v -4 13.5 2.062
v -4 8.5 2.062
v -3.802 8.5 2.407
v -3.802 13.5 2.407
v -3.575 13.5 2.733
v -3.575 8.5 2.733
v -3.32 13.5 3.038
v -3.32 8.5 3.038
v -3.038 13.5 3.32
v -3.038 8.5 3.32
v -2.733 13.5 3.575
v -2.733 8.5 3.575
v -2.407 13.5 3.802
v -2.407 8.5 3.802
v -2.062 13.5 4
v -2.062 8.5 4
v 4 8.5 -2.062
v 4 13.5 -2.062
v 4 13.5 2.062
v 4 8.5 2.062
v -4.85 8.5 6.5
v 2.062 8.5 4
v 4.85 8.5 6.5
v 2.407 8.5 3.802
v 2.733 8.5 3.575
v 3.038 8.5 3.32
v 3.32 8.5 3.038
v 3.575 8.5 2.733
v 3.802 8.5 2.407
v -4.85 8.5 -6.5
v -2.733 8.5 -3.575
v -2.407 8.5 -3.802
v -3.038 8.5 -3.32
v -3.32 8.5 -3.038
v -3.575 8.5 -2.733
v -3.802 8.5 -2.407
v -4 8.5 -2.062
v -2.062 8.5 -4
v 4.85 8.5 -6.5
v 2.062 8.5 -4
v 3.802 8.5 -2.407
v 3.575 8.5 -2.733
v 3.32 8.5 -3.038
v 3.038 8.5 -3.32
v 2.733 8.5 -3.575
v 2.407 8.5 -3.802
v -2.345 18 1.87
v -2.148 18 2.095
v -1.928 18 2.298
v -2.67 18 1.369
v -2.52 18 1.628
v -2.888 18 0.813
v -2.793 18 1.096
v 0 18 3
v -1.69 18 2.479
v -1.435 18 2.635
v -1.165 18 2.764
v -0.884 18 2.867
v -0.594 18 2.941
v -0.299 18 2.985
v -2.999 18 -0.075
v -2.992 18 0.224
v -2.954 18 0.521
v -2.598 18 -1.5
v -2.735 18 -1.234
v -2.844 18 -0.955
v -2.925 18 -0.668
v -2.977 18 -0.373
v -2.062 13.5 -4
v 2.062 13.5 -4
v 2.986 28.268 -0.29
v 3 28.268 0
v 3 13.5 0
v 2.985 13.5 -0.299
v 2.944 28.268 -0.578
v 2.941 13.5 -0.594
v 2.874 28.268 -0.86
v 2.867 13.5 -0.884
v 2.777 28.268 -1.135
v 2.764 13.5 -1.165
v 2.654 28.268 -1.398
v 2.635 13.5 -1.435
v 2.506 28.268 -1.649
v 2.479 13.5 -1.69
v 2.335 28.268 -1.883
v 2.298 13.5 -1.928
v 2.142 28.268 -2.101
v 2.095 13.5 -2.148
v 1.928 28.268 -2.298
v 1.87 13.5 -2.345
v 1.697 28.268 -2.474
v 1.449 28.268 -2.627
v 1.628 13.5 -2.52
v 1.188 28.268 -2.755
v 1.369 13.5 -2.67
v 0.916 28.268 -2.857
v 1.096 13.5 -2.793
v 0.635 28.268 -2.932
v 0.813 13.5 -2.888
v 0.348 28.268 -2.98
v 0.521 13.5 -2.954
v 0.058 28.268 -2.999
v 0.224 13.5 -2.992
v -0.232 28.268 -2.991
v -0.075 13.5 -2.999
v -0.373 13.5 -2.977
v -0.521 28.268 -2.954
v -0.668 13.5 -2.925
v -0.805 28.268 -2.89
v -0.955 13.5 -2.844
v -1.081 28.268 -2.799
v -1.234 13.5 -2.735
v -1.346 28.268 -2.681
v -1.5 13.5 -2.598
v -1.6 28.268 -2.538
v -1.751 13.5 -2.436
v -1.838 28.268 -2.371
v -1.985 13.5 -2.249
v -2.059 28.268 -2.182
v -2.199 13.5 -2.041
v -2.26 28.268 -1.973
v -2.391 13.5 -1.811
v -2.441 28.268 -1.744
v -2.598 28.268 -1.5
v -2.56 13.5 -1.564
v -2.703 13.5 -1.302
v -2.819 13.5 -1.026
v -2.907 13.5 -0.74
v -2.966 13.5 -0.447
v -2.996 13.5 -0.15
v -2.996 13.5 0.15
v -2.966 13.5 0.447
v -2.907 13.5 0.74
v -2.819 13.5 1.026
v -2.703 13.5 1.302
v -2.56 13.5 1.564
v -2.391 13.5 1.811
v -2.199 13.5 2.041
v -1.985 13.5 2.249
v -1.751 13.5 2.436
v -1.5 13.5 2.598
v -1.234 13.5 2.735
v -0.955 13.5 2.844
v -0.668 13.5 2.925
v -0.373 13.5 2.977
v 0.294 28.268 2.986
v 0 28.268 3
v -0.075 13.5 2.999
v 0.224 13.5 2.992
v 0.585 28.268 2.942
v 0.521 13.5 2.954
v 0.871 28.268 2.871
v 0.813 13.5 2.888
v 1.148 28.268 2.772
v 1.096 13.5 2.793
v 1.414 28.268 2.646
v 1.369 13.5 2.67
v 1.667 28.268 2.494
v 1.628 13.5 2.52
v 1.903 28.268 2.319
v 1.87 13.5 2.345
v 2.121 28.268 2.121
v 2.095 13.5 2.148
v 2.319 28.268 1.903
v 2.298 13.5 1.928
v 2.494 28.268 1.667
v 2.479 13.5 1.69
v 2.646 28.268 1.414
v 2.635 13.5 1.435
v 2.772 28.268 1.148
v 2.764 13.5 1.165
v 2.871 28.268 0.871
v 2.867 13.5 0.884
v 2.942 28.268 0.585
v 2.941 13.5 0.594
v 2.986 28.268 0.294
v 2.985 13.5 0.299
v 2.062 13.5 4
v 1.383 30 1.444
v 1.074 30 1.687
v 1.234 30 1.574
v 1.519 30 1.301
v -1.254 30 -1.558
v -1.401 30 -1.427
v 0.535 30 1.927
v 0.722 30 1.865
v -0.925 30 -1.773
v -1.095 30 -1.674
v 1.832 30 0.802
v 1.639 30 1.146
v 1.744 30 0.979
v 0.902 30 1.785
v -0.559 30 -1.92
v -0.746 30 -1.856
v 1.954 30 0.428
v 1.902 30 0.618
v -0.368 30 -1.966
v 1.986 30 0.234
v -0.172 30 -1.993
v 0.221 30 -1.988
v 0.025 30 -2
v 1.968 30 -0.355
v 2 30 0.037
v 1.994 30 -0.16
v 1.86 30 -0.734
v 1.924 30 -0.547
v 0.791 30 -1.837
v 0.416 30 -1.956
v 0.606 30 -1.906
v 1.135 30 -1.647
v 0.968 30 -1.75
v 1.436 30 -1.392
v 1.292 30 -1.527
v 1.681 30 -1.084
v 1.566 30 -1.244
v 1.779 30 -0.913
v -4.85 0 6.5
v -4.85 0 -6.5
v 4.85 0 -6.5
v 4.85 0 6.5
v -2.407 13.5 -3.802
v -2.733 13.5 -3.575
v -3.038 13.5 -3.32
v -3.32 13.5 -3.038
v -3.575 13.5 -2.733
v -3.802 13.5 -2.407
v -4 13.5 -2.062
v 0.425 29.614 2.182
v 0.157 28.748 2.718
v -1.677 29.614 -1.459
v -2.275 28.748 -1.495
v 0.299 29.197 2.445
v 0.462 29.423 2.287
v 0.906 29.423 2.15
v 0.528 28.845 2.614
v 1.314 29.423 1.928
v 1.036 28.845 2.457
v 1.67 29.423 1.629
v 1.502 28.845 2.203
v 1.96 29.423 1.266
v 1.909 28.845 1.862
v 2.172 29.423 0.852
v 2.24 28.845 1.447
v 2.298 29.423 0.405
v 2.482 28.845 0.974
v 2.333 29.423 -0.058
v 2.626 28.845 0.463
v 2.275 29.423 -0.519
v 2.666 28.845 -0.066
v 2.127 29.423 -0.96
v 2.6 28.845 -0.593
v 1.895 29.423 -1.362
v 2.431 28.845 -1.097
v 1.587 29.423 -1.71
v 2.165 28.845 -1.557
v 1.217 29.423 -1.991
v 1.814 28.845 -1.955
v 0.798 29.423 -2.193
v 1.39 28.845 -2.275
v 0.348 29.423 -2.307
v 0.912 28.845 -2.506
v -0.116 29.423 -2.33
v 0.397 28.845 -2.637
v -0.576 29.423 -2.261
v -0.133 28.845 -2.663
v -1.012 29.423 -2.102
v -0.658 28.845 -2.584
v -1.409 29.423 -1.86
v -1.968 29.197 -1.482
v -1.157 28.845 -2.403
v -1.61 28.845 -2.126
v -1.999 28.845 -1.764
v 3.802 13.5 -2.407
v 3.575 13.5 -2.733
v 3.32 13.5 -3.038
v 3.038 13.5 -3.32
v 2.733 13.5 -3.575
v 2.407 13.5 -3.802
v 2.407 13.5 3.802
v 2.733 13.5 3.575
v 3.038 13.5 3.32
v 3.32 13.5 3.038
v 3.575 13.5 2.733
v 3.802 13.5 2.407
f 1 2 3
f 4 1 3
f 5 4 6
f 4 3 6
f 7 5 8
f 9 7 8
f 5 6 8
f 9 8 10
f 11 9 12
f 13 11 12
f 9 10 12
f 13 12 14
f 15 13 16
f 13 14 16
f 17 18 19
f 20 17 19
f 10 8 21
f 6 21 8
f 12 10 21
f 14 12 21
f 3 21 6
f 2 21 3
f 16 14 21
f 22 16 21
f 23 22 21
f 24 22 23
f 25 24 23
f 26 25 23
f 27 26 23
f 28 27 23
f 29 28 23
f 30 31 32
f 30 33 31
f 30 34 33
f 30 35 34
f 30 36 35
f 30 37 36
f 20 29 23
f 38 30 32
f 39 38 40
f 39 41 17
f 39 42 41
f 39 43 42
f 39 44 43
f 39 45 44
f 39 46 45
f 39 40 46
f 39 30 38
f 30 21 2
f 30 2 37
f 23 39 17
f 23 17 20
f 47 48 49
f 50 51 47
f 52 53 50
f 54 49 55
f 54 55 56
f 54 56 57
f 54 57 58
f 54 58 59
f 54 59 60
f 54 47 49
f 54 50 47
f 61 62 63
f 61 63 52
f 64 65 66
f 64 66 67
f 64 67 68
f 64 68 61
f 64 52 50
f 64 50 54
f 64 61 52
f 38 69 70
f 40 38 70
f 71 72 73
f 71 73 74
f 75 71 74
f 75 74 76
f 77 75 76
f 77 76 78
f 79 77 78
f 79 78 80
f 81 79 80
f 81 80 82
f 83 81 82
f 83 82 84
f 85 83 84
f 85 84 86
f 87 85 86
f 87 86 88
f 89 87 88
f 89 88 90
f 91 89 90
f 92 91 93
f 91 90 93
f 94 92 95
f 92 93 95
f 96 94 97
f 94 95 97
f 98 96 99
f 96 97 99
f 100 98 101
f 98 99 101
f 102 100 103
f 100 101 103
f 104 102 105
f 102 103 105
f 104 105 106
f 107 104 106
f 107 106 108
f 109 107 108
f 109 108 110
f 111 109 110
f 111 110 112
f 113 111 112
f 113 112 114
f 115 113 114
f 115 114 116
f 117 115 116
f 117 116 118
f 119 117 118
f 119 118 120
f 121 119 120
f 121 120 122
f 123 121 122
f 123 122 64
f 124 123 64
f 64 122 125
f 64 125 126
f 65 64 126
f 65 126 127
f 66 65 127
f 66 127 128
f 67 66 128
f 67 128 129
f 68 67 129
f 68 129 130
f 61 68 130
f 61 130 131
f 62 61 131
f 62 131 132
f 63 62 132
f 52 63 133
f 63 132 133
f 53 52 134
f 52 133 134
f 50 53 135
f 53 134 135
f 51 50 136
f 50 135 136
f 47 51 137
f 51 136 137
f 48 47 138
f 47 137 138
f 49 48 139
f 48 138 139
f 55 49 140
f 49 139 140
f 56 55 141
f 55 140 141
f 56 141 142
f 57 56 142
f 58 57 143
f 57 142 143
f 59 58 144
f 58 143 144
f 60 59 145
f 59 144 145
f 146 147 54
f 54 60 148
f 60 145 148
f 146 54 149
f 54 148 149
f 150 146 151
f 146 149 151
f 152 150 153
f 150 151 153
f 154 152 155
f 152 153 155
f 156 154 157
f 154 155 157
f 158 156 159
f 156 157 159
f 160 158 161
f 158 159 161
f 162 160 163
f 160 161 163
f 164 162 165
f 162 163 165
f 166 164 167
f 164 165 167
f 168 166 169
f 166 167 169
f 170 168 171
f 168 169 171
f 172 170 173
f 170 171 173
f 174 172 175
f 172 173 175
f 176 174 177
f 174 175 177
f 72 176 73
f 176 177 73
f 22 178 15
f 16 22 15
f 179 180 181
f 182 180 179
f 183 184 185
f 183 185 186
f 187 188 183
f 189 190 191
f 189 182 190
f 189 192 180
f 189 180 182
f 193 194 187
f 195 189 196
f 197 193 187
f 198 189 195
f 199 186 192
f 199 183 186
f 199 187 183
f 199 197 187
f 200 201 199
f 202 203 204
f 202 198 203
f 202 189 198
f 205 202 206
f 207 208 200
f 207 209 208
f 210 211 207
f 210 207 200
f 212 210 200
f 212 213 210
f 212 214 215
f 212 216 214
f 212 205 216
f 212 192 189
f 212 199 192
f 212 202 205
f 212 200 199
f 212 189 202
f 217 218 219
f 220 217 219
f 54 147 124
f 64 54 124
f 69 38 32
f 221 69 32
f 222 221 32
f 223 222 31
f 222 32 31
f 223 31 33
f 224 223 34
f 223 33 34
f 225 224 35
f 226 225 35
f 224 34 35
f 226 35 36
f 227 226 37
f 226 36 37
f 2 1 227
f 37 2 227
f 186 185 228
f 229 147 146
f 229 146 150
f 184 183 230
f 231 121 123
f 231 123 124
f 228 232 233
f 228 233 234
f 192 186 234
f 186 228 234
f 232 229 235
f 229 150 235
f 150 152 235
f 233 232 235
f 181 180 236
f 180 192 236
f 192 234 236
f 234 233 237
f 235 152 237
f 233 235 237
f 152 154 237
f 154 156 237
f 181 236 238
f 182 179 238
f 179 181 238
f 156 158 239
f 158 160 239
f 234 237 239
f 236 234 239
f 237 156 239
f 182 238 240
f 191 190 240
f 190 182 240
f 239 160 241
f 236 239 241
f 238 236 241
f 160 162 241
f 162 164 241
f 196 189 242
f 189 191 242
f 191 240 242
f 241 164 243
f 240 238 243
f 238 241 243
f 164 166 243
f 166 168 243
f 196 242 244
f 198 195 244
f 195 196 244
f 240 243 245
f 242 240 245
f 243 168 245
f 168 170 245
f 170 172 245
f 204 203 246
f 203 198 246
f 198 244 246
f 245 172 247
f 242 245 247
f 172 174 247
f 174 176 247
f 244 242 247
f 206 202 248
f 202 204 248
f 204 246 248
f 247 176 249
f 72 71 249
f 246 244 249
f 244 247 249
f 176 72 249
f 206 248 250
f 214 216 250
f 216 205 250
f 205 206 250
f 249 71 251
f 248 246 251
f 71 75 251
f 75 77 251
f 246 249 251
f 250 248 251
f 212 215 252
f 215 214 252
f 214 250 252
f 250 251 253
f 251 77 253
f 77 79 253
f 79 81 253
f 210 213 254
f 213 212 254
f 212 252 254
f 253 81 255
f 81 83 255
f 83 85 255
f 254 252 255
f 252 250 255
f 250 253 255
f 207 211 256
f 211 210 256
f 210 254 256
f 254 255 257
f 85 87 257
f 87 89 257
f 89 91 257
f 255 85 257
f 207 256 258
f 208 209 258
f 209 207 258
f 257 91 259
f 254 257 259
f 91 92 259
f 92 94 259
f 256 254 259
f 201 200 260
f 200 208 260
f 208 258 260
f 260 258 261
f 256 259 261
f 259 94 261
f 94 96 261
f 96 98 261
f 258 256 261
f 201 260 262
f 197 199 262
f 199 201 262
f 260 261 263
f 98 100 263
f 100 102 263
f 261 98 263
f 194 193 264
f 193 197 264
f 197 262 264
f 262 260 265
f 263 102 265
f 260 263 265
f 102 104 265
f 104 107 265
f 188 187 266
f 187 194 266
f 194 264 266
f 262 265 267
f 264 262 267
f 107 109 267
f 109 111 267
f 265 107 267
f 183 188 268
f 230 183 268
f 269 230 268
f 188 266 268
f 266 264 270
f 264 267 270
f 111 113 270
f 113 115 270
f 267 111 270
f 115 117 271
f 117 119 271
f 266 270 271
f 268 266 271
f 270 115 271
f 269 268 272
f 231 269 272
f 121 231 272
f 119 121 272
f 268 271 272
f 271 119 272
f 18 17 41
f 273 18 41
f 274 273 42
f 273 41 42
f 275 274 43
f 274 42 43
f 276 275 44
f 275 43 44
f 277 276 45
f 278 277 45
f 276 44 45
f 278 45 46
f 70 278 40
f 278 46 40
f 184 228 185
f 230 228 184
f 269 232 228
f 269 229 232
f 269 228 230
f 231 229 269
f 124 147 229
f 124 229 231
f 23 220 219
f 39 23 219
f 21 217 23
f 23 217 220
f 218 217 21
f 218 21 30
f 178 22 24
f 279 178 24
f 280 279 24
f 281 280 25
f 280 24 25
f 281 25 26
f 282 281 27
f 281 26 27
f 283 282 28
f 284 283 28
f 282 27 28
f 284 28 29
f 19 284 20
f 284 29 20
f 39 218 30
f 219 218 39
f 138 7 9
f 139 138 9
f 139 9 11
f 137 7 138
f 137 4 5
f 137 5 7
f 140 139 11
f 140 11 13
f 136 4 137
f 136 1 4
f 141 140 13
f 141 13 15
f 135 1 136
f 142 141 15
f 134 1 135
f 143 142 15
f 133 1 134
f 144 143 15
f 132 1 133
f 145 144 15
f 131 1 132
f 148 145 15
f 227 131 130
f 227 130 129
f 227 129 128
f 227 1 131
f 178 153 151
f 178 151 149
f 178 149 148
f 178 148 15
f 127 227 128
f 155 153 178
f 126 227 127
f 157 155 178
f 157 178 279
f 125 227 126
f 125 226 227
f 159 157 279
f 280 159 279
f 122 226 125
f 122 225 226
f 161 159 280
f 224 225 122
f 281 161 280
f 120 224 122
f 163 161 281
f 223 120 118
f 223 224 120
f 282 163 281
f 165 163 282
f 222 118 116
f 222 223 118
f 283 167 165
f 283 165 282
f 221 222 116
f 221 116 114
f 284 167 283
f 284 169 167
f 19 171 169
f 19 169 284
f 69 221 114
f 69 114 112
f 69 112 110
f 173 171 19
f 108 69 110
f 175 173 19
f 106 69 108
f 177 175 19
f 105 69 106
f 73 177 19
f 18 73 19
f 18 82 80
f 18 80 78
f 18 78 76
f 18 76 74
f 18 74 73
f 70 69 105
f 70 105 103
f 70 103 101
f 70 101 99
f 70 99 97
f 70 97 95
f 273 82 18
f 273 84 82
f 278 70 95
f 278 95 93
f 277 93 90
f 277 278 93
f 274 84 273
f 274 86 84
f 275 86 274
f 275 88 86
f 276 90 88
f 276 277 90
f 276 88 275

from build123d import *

# Parameters (mm, degrees)
SKETCH1_W           = 9.7
SKETCH1_H           = 13
BOSS_EXTRUDE1_DEPTH = 8.5
SKETCH2_R           = 4.5
BOSS_EXTRUDE2_DEPTH = 5
BOSS_EXTRUDE4_START = -5
SKETCH3_R           = 3
BOSS_EXTRUDE4_DEPTH = 21.5
CUT_EXTRUDE1_DEPTH  = 5
CUT_EXTRUDE2_DEPTH  = 12
CHAMFER1_SIZE       = 1
CHAMFER1_SIZE2      = 1.732050808


with BuildPart() as part:
    # Sketch1 → Boss-Extrude1 (new body)
    with BuildSketch(Plane(origin=(0, 0, 0), x_dir=(1, 0, 0), z_dir=(0, 1, 0))):
        Rectangle(SKETCH1_W, SKETCH1_H)
    extrude(amount=BOSS_EXTRUDE1_DEPTH)

    # Sketch2 → Boss-Extrude2 (add)
    with BuildSketch(Plane(origin=(0, 8.5, 0), x_dir=(1, 0, 0), z_dir=(0, 1, 0))):
        Circle(SKETCH2_R)
    extrude(amount=BOSS_EXTRUDE2_DEPTH)

    # Sketch3 → Boss-Extrude4 (add)
    with BuildSketch(Plane(origin=(0, 13.5, 0), x_dir=(1, 0, 0), z_dir=(0, 1, 0)).offset(BOSS_EXTRUDE4_START)):
        Circle(SKETCH3_R)
    extrude(amount=BOSS_EXTRUDE4_DEPTH)

    # Sketch4 → Cut-Extrude1 (cut)
    with BuildSketch(Plane(origin=(0, 13.5, 0), x_dir=(1, 0, 0), z_dir=(0, 1, 0))):
        with BuildLine():
            ThreePointArc((-4, 2.061552813), (-4.5, 0), (-4, -2.061552813))
            Line((-4, -2.061552813), (-4, 2.061552813))
        make_face()
        with BuildLine():
            ThreePointArc((-2.061552813, -4), (0, -4.5), (2.061552813, -4))
            Line((2.061552813, -4), (-2.061552813, -4))
        make_face()
        with BuildLine():
            Line((4, 2.061552813), (4, -2.061552813))
            ThreePointArc((4, -2.061552813), (4.373213921, -1.060660172), (4.5, 0))
            ThreePointArc((4.5, 0), (4.373213921, 1.060660172), (4, 2.061552813))
        make_face()
        with BuildLine():
            Line((-2.061552813, 4), (2.061552813, 4))
            ThreePointArc((2.061552813, 4), (0, 4.5), (-2.061552813, 4))
        make_face()
    extrude(amount=-CUT_EXTRUDE1_DEPTH, mode=Mode.SUBTRACT)

    # Sketch5 → Cut-Extrude2 (cut)
    with BuildSketch(Plane(origin=(0, 30, 0), x_dir=(1, 0, 0), z_dir=(0, 1, 0))):
        with BuildLine():
            Line((0, -3), (-2.598076211, 1.5))
            ThreePointArc((-2.598076211, 1.5), (-2.598076211, -1.5), (0, -3))
        make_face()
    extrude(amount=-CUT_EXTRUDE2_DEPTH, mode=Mode.SUBTRACT)

    # Chamfer1
    chamfer1_edges = [part.edges().sort_by_distance(p)[0] for p in [
        (0.776457135, 30, -2.897777479),
        (-1.299038106, 30, 0.75),
    ]]
    chamfer1_side = [part.faces().sort_by_distance(p)[0] for p in [
        (0.445120094, 30, -0.256990206),
    ]]
    chamfer(chamfer1_edges, length=CHAMFER1_SIZE, length2=CHAMFER1_SIZE2, reference=chamfer1_side[0])


solid = part.part
